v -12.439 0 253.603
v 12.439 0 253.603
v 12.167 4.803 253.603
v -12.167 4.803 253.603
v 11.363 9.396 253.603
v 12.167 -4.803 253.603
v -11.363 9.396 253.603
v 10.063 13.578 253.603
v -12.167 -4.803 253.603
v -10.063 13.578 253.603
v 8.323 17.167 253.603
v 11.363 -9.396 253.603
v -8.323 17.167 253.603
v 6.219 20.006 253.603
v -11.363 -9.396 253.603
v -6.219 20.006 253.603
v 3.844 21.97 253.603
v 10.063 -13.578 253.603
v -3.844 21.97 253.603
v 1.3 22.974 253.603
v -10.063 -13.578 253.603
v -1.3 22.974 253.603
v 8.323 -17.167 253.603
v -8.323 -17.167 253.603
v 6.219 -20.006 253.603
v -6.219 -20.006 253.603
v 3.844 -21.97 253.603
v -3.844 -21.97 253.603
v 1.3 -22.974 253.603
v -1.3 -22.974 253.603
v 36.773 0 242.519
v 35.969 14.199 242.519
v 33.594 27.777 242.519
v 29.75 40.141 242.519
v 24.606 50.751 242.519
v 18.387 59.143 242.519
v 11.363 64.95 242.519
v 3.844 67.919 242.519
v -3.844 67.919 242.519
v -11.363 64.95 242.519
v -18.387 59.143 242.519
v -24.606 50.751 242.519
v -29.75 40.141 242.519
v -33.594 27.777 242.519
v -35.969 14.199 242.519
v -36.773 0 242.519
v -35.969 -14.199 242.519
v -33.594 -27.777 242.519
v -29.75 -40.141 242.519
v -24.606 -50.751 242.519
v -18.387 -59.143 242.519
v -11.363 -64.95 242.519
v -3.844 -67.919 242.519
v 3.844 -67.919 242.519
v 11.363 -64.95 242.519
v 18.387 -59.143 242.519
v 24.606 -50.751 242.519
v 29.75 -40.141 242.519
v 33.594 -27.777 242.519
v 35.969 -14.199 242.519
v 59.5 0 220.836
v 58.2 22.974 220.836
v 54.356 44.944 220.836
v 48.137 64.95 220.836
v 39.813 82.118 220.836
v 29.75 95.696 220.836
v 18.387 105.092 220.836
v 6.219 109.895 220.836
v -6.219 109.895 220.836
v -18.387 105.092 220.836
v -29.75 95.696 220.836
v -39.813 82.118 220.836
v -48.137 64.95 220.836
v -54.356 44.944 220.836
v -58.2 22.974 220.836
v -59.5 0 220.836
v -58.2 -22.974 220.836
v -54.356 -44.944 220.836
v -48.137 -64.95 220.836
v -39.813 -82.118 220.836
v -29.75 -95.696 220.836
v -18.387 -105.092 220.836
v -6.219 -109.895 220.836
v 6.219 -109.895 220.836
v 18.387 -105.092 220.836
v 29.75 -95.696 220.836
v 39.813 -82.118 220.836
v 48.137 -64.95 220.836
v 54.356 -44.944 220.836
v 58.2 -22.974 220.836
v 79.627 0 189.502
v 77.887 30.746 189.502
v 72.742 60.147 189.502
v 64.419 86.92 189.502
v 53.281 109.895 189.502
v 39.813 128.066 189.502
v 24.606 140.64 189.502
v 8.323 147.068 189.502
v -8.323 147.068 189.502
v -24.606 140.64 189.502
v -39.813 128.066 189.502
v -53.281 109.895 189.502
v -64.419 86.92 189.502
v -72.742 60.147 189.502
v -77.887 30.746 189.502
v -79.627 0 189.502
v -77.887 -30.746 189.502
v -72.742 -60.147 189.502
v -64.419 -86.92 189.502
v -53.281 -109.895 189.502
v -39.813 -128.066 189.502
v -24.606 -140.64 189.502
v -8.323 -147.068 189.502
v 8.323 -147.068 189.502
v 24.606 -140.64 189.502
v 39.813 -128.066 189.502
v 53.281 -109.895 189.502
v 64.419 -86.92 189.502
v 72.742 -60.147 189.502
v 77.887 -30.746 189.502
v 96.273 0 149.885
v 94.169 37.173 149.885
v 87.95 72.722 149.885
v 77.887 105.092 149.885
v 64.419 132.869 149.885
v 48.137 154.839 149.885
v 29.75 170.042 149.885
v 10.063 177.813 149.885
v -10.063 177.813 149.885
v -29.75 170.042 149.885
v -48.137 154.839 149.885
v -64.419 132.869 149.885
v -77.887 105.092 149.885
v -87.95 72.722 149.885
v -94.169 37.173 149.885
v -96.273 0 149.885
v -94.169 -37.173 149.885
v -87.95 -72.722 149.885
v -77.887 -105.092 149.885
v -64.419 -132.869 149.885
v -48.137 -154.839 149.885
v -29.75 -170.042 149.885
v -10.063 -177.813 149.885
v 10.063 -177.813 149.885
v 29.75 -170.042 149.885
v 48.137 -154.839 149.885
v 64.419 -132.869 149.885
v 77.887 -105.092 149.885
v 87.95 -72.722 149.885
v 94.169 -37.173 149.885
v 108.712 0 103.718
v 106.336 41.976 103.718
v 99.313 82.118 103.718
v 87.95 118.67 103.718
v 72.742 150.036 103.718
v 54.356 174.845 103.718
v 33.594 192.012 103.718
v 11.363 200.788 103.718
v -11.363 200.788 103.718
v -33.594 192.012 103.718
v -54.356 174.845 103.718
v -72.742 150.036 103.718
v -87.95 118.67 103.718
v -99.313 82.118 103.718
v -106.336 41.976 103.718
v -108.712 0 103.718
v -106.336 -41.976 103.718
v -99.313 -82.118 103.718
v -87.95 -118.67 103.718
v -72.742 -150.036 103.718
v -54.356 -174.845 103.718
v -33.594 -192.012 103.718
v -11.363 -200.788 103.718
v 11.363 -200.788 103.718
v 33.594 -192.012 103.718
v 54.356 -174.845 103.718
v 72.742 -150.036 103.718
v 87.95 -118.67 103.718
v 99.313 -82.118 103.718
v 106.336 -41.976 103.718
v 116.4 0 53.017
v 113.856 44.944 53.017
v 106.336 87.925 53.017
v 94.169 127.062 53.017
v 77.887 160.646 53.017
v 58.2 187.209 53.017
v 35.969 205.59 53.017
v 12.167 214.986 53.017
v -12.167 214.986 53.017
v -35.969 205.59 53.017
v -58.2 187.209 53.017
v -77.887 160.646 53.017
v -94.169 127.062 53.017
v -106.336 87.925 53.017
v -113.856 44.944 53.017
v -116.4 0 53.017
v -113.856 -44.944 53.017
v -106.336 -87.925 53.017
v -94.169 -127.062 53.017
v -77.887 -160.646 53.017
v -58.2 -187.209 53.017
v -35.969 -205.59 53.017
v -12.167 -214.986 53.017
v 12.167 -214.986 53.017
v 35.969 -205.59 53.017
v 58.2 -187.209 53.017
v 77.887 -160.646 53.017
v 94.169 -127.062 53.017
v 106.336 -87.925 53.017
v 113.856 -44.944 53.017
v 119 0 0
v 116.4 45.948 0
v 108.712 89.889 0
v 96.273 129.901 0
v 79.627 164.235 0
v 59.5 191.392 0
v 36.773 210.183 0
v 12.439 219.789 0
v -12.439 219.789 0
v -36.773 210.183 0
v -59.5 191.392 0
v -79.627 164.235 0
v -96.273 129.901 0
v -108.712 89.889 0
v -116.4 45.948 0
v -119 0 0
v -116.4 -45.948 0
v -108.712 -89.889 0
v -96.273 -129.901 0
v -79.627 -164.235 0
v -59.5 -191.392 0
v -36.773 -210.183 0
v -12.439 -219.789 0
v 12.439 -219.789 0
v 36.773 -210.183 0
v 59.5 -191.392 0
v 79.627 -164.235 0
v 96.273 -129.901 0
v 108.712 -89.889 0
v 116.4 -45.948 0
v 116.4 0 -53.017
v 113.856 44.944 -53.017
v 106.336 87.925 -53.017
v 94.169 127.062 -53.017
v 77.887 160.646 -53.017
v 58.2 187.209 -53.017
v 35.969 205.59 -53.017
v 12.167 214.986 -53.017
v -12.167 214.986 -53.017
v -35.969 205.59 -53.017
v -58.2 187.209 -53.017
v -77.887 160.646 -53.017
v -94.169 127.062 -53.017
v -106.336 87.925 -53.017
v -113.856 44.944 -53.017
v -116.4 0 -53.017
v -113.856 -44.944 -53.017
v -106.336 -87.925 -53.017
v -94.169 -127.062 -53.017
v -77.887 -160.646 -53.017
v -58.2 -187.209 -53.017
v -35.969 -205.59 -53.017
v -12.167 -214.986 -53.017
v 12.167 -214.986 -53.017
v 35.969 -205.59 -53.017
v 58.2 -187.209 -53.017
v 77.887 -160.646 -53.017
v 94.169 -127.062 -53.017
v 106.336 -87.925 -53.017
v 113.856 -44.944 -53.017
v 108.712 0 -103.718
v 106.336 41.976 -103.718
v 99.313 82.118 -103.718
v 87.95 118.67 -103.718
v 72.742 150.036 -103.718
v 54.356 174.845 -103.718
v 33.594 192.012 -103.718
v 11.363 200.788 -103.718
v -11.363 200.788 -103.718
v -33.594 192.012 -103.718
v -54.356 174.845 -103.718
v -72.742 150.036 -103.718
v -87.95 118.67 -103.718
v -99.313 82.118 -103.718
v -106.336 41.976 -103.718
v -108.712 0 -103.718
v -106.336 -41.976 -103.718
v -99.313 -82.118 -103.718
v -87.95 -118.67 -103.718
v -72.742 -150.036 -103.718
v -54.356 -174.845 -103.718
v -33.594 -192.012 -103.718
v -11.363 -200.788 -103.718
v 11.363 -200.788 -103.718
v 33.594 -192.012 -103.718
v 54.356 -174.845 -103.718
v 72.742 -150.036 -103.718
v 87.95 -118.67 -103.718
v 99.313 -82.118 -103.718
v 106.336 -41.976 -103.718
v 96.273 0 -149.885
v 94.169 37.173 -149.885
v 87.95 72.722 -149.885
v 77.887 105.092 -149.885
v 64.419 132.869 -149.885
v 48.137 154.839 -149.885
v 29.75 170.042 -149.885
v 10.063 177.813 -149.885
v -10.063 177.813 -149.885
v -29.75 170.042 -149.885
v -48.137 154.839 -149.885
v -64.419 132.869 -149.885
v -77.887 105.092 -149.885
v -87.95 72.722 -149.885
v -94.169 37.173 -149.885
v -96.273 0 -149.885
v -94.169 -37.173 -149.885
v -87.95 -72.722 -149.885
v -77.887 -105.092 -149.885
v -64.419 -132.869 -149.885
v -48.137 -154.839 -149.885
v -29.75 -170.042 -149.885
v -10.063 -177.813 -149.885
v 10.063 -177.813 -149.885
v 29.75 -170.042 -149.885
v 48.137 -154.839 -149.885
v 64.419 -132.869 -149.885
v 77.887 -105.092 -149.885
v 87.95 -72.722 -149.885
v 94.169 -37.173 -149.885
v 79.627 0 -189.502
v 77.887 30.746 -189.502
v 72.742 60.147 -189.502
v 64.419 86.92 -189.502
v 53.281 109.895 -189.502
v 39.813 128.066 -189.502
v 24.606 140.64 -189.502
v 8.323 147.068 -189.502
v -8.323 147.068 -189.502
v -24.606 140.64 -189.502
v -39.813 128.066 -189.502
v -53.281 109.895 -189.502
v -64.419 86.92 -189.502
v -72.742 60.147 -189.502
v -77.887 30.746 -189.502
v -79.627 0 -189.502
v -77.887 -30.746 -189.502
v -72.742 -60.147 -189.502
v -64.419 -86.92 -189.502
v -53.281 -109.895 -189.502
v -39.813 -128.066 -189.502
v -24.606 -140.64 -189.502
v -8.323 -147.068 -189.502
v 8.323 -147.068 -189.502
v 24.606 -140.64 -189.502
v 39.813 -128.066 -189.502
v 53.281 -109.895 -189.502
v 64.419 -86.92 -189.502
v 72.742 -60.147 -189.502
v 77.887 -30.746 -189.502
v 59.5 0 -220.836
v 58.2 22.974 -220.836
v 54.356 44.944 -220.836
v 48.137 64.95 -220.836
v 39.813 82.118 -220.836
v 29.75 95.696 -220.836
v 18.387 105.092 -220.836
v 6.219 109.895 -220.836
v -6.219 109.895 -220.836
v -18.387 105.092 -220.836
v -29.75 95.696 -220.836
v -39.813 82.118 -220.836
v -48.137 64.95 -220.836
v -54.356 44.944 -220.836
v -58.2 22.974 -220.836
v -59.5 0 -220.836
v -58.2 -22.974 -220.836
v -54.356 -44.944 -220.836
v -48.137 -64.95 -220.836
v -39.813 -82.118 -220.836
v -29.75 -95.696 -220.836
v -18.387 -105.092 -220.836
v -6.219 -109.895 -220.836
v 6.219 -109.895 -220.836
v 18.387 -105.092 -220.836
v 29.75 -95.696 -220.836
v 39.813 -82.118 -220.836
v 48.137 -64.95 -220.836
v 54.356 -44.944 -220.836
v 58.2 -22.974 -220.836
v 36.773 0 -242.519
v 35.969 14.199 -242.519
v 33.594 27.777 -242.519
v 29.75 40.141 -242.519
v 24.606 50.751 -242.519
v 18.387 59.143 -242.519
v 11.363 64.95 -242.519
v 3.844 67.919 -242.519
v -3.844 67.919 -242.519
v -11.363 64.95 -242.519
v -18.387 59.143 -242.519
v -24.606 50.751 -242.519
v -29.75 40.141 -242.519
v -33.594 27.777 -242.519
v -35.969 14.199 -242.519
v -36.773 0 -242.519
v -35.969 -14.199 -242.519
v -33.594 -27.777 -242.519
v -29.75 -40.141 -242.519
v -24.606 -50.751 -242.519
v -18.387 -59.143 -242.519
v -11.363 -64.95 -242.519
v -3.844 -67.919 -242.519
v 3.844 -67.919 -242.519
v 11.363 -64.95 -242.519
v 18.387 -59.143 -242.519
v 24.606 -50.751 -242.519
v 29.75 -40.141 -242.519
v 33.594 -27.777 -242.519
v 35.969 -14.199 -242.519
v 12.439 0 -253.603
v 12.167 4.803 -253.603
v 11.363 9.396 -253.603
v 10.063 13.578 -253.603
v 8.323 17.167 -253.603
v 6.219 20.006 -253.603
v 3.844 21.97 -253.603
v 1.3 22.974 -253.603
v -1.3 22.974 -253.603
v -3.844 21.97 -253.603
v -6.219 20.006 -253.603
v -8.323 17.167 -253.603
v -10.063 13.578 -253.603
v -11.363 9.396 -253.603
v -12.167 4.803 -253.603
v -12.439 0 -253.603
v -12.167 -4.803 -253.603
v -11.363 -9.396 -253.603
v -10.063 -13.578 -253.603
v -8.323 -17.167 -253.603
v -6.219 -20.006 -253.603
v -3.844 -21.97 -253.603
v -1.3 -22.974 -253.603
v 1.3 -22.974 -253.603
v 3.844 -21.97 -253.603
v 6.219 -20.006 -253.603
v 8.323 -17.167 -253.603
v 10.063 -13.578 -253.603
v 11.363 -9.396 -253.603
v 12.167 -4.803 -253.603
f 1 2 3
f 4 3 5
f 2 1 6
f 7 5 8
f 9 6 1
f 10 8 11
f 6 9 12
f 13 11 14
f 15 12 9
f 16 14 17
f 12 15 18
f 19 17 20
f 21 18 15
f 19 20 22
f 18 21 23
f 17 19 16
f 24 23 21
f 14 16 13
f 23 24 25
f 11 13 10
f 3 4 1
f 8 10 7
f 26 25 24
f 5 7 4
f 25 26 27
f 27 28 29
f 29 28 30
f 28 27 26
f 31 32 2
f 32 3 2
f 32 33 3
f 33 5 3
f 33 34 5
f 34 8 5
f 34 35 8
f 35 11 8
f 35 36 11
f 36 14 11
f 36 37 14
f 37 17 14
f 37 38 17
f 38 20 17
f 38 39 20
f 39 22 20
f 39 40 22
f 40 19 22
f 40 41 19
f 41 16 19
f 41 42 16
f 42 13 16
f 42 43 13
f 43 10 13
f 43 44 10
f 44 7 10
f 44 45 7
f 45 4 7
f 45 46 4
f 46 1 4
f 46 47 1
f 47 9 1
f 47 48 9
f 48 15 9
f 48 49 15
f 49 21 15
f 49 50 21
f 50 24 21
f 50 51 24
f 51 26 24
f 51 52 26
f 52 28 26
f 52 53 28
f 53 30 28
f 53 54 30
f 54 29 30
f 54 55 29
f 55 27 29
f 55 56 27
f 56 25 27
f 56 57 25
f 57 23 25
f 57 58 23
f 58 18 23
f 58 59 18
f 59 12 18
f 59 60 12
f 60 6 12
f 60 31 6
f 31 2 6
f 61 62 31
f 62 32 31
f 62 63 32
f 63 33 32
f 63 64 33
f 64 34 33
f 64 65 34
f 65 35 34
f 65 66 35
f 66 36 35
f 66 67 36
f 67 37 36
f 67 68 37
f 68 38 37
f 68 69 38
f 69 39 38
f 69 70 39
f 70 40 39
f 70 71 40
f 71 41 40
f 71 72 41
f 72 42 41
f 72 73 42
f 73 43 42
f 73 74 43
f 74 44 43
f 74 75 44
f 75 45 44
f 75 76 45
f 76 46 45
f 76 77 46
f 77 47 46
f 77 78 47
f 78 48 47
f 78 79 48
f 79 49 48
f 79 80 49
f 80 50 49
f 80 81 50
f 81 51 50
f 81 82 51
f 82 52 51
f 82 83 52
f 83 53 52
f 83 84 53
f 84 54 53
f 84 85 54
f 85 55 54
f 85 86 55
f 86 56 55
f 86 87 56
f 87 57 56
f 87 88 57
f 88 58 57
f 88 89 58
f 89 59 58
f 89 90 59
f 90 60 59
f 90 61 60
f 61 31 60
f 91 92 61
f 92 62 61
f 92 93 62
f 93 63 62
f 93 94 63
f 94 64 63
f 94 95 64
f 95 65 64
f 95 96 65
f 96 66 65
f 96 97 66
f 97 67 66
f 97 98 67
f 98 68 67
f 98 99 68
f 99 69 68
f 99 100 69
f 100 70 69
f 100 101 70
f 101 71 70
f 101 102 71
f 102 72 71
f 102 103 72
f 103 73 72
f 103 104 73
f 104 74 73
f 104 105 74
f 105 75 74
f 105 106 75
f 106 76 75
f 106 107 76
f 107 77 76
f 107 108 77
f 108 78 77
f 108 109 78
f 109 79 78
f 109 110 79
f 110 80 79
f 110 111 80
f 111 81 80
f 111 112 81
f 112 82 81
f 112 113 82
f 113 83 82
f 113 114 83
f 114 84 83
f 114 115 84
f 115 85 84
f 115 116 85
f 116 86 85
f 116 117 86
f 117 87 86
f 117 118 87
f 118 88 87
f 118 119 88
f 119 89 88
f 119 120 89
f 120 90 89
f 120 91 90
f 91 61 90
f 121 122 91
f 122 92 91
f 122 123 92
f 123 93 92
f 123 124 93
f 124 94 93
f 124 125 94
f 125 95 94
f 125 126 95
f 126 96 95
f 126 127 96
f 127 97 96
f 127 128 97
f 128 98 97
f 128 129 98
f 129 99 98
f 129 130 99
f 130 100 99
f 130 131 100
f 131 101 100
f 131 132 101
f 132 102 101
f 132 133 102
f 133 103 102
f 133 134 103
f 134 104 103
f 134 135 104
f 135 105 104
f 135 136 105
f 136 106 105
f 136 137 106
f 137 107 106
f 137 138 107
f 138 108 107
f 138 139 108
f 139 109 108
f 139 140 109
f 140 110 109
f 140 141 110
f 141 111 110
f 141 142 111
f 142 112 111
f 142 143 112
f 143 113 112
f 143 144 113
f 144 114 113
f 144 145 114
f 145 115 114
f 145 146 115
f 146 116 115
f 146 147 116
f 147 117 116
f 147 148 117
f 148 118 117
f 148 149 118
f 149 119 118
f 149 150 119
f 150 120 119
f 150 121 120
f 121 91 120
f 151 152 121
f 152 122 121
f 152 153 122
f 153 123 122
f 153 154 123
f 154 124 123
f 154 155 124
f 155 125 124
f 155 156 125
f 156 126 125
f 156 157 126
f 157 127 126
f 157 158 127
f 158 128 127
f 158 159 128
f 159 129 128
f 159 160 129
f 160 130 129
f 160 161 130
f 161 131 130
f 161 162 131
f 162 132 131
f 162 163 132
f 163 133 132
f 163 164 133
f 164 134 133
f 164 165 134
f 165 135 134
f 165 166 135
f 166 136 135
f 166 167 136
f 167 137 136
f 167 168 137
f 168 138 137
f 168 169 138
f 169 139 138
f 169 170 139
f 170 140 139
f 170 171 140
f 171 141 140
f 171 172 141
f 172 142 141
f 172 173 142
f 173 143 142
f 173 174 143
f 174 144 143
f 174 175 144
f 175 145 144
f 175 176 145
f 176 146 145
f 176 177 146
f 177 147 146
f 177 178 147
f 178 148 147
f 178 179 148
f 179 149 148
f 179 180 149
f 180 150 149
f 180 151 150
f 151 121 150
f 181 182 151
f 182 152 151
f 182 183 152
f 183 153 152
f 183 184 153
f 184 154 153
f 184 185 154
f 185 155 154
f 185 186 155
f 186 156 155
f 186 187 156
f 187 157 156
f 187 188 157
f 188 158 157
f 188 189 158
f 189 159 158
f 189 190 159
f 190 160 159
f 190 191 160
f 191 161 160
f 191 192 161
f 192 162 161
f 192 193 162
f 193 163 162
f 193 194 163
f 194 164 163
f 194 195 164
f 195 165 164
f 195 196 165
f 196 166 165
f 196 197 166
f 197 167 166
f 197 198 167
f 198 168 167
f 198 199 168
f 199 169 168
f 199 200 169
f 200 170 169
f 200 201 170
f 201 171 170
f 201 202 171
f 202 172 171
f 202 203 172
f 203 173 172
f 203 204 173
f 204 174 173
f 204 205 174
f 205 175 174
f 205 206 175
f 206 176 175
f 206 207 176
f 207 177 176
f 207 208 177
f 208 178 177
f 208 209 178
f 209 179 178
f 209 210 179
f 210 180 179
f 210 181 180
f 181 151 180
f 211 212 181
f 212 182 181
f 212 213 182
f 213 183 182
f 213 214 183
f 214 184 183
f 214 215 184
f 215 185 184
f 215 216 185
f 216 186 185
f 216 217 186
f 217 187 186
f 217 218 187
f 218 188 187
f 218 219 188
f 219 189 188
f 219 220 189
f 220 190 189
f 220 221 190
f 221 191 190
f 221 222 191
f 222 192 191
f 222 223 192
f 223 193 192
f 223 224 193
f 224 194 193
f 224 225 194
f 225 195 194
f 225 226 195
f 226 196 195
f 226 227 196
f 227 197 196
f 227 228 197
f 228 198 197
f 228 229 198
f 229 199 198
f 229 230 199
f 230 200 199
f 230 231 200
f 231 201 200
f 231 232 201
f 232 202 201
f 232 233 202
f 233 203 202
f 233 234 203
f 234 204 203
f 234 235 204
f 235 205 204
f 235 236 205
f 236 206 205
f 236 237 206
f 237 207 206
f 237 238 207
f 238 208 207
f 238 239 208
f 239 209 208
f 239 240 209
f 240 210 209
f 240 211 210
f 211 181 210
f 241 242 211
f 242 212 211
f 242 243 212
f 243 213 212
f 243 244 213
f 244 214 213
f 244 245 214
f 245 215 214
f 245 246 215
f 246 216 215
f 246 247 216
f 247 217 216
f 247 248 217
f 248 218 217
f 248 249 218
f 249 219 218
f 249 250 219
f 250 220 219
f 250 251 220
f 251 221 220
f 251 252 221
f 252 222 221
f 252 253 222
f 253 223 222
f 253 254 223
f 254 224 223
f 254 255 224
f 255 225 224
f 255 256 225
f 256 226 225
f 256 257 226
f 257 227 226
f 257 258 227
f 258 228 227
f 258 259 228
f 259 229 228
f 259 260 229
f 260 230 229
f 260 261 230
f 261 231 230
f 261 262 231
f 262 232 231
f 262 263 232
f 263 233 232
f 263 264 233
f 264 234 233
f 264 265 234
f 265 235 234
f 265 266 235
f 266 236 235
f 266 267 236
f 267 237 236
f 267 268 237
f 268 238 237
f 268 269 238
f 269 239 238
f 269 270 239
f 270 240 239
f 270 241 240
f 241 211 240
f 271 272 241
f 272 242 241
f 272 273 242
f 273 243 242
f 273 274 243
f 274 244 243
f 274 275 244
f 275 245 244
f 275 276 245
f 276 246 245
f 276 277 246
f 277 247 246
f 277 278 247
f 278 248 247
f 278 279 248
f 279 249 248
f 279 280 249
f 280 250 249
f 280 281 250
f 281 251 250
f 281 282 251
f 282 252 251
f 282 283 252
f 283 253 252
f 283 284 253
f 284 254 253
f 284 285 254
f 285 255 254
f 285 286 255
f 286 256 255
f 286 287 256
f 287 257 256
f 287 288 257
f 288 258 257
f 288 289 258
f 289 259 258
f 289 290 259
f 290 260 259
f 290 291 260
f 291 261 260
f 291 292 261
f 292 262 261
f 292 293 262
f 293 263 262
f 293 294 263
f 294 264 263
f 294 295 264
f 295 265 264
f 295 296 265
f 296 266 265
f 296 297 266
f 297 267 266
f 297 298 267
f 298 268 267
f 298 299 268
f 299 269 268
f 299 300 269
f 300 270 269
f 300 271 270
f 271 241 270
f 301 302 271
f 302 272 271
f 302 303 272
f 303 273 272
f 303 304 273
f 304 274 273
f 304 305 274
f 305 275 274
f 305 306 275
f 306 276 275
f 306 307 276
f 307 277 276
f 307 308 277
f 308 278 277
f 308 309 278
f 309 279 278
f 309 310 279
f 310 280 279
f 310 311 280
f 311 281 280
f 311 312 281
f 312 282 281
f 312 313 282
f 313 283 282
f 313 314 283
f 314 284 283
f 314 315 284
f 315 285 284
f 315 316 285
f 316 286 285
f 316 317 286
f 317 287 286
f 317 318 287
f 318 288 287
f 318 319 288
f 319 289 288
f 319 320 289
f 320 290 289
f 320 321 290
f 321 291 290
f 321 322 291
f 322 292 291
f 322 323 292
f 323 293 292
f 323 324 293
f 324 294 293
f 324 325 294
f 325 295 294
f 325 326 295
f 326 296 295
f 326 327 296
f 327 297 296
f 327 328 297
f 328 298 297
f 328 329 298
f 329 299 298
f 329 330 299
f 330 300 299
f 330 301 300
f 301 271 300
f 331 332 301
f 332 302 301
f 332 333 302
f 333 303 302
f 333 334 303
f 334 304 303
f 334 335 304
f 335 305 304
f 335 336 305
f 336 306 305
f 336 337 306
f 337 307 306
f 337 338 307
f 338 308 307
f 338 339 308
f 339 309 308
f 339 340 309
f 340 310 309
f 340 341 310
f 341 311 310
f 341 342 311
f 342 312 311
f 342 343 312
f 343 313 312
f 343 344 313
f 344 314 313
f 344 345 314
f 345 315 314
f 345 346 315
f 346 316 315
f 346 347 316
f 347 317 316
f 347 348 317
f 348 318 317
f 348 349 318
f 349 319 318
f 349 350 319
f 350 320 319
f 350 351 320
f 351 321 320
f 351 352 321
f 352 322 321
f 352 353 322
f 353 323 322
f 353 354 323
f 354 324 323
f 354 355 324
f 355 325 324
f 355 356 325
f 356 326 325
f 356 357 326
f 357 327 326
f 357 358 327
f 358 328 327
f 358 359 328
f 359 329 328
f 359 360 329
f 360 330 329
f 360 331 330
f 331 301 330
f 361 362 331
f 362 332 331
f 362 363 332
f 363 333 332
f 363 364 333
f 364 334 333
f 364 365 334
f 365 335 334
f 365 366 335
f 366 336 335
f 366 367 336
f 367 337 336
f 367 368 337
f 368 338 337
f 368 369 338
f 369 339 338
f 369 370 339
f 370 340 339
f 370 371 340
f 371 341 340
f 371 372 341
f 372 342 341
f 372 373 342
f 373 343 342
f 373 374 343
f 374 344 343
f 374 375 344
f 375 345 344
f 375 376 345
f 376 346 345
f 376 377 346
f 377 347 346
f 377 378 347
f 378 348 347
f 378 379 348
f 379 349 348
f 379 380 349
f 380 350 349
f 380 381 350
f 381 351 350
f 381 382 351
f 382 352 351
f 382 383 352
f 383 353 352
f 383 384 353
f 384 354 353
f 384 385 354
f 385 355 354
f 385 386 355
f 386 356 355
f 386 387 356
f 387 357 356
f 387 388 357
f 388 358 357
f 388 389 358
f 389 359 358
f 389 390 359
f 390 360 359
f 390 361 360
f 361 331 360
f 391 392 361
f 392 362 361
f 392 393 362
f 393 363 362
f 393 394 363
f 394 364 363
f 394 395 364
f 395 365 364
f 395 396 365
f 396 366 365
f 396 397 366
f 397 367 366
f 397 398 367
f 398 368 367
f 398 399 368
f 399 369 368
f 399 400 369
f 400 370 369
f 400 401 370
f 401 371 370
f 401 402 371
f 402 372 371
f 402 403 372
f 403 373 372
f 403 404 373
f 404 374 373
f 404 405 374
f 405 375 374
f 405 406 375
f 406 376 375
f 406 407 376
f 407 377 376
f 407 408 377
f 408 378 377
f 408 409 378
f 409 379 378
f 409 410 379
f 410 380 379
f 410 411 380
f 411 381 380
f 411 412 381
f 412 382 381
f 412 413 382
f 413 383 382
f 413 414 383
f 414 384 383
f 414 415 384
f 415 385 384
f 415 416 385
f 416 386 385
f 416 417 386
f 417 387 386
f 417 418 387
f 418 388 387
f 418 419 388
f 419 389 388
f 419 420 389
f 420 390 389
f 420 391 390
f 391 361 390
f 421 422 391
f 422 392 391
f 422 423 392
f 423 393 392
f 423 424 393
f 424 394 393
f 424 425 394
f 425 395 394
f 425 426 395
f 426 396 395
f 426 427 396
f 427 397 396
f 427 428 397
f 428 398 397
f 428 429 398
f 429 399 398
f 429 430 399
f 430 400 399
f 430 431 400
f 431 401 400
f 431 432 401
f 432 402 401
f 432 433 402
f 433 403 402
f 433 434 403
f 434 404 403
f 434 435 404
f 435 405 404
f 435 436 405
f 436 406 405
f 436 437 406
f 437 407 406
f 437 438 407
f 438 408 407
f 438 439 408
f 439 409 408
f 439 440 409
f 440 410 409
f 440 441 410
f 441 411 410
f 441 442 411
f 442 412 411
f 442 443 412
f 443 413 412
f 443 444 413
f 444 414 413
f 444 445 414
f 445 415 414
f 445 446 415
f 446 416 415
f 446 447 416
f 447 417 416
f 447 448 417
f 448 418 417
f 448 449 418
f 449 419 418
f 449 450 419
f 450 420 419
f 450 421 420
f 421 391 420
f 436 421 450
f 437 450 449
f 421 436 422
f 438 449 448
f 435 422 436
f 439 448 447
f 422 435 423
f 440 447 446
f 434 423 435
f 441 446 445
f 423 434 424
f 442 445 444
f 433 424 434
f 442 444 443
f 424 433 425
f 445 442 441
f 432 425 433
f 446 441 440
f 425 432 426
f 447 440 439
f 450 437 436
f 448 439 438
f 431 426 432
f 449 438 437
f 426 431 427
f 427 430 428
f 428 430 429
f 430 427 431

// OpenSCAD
// Generated by SolidPython 1.0.1 on 2020-07-29 00:39:26


scale(v = [7, 13, 15]) {
	sphere(r = 17);
}
/***********************************************
*********      SolidPython code:      **********
************************************************
 
# import packages: SolidPython
from solid import *
from solid.utils import *
from itertools import chain, combinations


class Resize:

    def __init__(self, scad_file):
        self.scad_file = scad_file
        #self.scad_file = import_scad(scad_file)
        # cone/cylinder param:
        self.r1 = 0
        self.r2 = 0
        self.h = 0
        # rectangular prism param:
        self.w = 0
        self.l = 0
        # ellipse param:
        self.r = 0

    # import OpenScad code (file name corresponds to shape)


    # classify shape + parameters
    def assign(self, param1, param2, param3):
        if self.scad_file == 'cone.scad':
            self.r1 = param1
            self.r2 = param2
            self.h = param3
        elif self.scad_file == 'cylinder.scad':
            self.r1 = param1
            self.r2 = param2
            self.h = param3
        elif self.scad_file == 'rectangularPrism.scad':
            self.h = param1
            self.l = param2
            self.w = param3
        else:
            self.r = param1
            self.h = param2

    # resize parameters
    def iterate(self):
        x = range(3, 20, 2)
        i = 1
        if self.scad_file == 'cone.scad':
            tempList = list(combinations(x, 2))
            for temp in tempList:
                param1 = temp[0]
                param2 = temp[1]
                filepath = 'produced_scad_files/' + 'cone' + str(param1) + '_' + str(param2) + '_' + '.scad'
                scad_render_to_file(cylinder(h=param1, r1=param2, r2=0), filepath)

        elif self.scad_file == 'cylinder.scad':
            tempList = list(combinations(x, 3))
            for temp in tempList:
                param1 = temp[0]
                param2 = temp[1]
                filepath = 'produced_scad_files/' + 'cylinder' + str(param1) + '_' + str(param2) + '_' + '.scad'
                scad_render_to_file(cylinder(h=param1, r1=param2, r2=param2), filepath)

        elif self.scad_file == 'rectangularPrism.scad':
            tempList = list(combinations(x, 3))
            for temp in tempList:
                param1 = temp[0]
                param2 = temp[1]
                param3 = temp[2]
                filepath = 'produced_scad_files/' + 'rectangularPrism' + str(param1) + '_' + str(param2) + '_' + str(
                    param3) + '.scad'
                scad_render_to_file(cube(size=(param1, param2, param3)), filepath)

        elif self.scad_file == 'ellipse.scad':
            tempList = list(combinations(x, 4))
            for temp in tempList:
                param1 = temp[0]
                param2 = temp[1]
                param3 = temp[2]
                param4 = temp[3]
                filepath = 'produced_scad_files/' + 'ellipse' + str(param1) + '_' + str(param2) + '_' + str(param3) + '_' + str(param4) + '.scad'
                scad_render_to_file(scale([param1, param2, param3])(sphere(r=param4)), filepath)

    def render_to_scadfile(self):
        scad_render_to_file(scad, 'example.scad') 
 
************************************************/
